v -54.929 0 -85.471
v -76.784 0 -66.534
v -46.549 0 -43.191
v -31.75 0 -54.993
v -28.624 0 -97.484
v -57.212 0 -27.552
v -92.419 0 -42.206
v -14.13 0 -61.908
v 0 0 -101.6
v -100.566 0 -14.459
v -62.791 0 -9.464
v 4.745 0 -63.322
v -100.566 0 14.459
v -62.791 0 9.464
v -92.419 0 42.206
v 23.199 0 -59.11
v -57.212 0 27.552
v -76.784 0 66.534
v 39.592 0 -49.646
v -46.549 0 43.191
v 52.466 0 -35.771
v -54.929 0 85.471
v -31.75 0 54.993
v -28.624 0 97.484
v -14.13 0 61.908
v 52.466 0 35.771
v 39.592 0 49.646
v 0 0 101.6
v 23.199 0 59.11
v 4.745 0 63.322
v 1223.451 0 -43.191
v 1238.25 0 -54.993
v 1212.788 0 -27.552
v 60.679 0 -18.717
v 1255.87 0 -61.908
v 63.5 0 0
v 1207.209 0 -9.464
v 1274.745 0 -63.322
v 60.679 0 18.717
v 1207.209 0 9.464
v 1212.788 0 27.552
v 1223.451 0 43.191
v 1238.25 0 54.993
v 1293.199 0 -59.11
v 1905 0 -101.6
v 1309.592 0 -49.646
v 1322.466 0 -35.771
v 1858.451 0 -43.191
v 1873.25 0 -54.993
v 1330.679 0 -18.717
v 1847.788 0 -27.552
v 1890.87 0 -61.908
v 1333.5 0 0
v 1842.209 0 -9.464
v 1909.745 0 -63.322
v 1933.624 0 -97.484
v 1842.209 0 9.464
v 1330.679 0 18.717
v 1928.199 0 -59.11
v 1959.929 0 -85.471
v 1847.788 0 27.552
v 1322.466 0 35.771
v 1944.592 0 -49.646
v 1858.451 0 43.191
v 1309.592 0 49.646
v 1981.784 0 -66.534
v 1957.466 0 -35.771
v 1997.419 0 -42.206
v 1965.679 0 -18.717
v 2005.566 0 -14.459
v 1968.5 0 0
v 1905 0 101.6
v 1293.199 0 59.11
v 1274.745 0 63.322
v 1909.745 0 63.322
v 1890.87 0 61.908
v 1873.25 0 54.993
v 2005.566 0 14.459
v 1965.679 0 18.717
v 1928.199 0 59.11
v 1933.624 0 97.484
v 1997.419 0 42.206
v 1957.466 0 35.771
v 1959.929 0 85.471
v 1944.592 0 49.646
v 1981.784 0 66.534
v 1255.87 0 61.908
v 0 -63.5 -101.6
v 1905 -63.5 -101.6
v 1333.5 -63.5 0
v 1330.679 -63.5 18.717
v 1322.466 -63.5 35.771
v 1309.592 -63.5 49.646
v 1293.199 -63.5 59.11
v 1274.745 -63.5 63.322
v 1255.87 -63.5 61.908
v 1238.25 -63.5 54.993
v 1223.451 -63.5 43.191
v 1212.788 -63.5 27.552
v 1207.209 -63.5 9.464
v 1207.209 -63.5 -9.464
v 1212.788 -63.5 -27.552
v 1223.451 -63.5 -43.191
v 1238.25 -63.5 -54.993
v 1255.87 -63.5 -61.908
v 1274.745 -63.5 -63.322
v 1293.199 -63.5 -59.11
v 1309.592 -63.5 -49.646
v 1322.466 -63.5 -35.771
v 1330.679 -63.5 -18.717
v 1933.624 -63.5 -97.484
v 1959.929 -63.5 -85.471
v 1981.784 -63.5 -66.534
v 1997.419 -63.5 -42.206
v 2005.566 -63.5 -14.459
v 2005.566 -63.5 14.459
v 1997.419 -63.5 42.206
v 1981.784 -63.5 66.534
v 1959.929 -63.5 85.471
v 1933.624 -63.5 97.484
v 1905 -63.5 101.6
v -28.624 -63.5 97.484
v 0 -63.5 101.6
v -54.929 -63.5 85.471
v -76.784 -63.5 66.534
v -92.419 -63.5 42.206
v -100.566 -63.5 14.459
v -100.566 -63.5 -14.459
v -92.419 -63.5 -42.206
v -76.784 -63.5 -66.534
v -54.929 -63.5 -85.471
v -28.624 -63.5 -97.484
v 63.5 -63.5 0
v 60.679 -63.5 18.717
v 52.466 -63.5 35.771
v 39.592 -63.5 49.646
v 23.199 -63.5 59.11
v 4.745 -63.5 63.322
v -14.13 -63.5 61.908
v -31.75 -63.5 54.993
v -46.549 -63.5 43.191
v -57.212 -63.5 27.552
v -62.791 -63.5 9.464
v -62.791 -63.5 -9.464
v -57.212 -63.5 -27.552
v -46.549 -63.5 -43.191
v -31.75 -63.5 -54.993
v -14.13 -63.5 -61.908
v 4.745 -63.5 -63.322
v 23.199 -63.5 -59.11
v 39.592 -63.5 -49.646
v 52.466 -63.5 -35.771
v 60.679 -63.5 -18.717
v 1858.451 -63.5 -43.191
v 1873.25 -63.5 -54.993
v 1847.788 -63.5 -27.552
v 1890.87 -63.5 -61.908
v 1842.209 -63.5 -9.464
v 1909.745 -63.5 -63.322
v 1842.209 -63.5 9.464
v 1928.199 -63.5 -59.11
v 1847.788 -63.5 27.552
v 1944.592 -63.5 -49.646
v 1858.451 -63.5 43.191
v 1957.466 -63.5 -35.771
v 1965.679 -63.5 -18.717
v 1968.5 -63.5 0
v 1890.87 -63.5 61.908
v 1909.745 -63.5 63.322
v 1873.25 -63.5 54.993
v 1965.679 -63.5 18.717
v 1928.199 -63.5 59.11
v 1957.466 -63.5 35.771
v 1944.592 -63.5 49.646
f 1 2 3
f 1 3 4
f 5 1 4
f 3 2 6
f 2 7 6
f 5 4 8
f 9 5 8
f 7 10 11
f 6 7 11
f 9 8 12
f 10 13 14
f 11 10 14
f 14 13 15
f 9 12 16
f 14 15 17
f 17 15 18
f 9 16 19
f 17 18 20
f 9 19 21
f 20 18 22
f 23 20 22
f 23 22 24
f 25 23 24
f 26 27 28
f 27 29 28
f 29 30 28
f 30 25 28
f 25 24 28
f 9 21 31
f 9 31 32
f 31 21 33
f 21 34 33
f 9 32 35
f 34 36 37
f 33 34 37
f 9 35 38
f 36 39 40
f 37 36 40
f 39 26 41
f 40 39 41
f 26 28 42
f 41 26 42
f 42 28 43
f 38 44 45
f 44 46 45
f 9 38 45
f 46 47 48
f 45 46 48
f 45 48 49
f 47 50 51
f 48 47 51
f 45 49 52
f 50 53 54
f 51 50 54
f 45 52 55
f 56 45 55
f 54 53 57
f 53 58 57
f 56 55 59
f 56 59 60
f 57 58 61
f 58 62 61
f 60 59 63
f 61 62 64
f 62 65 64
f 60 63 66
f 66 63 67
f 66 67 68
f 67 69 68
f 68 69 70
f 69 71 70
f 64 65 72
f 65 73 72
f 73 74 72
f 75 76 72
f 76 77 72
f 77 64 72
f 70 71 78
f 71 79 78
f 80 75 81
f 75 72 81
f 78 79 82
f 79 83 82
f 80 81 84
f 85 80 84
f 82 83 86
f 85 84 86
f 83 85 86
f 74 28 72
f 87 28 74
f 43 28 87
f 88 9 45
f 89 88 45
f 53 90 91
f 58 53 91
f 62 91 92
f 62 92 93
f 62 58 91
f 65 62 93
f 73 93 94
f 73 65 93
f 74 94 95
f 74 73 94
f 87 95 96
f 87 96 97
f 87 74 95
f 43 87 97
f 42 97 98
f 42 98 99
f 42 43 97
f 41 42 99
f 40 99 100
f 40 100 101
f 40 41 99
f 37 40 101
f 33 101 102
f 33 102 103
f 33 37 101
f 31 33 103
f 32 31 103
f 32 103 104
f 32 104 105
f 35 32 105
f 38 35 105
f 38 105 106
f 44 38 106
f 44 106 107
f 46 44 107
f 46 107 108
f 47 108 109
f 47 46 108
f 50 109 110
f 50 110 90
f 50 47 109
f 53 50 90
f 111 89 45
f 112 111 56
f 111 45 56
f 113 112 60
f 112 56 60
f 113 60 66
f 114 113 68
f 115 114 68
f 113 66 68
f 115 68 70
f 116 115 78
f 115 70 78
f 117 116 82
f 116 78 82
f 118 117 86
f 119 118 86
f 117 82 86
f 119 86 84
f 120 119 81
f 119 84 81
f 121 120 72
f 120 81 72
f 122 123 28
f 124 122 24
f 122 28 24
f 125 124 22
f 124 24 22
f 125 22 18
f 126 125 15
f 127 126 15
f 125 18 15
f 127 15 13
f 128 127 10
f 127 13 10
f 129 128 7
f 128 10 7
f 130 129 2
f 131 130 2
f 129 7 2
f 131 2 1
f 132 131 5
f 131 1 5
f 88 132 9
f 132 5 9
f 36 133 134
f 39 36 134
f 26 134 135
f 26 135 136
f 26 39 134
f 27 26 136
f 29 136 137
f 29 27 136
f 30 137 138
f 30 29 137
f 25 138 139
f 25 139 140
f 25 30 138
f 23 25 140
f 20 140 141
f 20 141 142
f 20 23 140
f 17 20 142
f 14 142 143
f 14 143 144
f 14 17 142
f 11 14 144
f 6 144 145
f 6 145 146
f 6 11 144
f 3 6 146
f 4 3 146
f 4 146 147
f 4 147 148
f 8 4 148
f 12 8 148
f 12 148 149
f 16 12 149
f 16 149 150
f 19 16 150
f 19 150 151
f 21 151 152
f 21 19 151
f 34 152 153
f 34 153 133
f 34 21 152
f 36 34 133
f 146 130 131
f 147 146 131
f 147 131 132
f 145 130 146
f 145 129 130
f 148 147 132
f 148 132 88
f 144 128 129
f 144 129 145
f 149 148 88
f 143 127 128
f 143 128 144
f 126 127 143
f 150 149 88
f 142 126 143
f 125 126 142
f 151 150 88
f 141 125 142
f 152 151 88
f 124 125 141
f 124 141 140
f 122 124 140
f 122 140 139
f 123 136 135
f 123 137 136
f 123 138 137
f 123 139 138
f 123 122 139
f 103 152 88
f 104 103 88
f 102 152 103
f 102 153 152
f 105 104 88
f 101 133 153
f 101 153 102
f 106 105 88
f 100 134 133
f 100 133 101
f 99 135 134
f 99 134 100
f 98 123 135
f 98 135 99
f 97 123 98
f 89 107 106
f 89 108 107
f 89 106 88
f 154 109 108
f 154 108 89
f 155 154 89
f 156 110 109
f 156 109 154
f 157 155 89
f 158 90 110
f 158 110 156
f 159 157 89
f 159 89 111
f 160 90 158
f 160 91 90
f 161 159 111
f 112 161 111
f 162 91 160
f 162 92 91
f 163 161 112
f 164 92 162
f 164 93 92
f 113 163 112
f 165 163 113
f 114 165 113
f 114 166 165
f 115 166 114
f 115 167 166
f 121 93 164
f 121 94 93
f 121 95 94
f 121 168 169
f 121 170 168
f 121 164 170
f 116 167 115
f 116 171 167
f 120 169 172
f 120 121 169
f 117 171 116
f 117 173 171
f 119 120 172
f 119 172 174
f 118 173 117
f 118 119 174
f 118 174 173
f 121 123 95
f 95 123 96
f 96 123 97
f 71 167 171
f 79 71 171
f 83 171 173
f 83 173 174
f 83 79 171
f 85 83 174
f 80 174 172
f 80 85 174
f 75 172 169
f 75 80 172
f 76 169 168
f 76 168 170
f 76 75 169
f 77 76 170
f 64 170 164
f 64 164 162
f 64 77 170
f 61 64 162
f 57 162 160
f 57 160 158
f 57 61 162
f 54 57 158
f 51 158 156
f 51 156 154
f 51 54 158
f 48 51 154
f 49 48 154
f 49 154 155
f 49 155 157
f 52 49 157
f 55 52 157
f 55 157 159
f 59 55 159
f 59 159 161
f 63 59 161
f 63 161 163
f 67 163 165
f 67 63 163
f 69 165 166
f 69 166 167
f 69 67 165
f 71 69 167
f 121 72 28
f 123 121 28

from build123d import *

# Parameters (mm, degrees)
F0_R     = 63.5
F1_DEPTH = 63.5


with BuildPart() as f1:
    # F0 (on Front) → F1 (new body)
    with BuildSketch(Plane.XZ):
        with BuildLine():
            Line((1905, 101.6), (0, 101.6))
            ThreePointArc((0, 101.6), (-101.6, 0), (0, -101.6))
            Line((0, -101.6), (1905, -101.6))
            ThreePointArc((1905, -101.6), (2006.6, 0), (1905, 101.6))
        make_face()
        Circle(F0_R, mode=Mode.SUBTRACT)
        with Locations((1270, 0)):
            Circle(F0_R, mode=Mode.SUBTRACT)
        with Locations((1905, 0)):
            Circle(F0_R, mode=Mode.SUBTRACT)
    extrude(amount=F1_DEPTH)


solid = f1.part
